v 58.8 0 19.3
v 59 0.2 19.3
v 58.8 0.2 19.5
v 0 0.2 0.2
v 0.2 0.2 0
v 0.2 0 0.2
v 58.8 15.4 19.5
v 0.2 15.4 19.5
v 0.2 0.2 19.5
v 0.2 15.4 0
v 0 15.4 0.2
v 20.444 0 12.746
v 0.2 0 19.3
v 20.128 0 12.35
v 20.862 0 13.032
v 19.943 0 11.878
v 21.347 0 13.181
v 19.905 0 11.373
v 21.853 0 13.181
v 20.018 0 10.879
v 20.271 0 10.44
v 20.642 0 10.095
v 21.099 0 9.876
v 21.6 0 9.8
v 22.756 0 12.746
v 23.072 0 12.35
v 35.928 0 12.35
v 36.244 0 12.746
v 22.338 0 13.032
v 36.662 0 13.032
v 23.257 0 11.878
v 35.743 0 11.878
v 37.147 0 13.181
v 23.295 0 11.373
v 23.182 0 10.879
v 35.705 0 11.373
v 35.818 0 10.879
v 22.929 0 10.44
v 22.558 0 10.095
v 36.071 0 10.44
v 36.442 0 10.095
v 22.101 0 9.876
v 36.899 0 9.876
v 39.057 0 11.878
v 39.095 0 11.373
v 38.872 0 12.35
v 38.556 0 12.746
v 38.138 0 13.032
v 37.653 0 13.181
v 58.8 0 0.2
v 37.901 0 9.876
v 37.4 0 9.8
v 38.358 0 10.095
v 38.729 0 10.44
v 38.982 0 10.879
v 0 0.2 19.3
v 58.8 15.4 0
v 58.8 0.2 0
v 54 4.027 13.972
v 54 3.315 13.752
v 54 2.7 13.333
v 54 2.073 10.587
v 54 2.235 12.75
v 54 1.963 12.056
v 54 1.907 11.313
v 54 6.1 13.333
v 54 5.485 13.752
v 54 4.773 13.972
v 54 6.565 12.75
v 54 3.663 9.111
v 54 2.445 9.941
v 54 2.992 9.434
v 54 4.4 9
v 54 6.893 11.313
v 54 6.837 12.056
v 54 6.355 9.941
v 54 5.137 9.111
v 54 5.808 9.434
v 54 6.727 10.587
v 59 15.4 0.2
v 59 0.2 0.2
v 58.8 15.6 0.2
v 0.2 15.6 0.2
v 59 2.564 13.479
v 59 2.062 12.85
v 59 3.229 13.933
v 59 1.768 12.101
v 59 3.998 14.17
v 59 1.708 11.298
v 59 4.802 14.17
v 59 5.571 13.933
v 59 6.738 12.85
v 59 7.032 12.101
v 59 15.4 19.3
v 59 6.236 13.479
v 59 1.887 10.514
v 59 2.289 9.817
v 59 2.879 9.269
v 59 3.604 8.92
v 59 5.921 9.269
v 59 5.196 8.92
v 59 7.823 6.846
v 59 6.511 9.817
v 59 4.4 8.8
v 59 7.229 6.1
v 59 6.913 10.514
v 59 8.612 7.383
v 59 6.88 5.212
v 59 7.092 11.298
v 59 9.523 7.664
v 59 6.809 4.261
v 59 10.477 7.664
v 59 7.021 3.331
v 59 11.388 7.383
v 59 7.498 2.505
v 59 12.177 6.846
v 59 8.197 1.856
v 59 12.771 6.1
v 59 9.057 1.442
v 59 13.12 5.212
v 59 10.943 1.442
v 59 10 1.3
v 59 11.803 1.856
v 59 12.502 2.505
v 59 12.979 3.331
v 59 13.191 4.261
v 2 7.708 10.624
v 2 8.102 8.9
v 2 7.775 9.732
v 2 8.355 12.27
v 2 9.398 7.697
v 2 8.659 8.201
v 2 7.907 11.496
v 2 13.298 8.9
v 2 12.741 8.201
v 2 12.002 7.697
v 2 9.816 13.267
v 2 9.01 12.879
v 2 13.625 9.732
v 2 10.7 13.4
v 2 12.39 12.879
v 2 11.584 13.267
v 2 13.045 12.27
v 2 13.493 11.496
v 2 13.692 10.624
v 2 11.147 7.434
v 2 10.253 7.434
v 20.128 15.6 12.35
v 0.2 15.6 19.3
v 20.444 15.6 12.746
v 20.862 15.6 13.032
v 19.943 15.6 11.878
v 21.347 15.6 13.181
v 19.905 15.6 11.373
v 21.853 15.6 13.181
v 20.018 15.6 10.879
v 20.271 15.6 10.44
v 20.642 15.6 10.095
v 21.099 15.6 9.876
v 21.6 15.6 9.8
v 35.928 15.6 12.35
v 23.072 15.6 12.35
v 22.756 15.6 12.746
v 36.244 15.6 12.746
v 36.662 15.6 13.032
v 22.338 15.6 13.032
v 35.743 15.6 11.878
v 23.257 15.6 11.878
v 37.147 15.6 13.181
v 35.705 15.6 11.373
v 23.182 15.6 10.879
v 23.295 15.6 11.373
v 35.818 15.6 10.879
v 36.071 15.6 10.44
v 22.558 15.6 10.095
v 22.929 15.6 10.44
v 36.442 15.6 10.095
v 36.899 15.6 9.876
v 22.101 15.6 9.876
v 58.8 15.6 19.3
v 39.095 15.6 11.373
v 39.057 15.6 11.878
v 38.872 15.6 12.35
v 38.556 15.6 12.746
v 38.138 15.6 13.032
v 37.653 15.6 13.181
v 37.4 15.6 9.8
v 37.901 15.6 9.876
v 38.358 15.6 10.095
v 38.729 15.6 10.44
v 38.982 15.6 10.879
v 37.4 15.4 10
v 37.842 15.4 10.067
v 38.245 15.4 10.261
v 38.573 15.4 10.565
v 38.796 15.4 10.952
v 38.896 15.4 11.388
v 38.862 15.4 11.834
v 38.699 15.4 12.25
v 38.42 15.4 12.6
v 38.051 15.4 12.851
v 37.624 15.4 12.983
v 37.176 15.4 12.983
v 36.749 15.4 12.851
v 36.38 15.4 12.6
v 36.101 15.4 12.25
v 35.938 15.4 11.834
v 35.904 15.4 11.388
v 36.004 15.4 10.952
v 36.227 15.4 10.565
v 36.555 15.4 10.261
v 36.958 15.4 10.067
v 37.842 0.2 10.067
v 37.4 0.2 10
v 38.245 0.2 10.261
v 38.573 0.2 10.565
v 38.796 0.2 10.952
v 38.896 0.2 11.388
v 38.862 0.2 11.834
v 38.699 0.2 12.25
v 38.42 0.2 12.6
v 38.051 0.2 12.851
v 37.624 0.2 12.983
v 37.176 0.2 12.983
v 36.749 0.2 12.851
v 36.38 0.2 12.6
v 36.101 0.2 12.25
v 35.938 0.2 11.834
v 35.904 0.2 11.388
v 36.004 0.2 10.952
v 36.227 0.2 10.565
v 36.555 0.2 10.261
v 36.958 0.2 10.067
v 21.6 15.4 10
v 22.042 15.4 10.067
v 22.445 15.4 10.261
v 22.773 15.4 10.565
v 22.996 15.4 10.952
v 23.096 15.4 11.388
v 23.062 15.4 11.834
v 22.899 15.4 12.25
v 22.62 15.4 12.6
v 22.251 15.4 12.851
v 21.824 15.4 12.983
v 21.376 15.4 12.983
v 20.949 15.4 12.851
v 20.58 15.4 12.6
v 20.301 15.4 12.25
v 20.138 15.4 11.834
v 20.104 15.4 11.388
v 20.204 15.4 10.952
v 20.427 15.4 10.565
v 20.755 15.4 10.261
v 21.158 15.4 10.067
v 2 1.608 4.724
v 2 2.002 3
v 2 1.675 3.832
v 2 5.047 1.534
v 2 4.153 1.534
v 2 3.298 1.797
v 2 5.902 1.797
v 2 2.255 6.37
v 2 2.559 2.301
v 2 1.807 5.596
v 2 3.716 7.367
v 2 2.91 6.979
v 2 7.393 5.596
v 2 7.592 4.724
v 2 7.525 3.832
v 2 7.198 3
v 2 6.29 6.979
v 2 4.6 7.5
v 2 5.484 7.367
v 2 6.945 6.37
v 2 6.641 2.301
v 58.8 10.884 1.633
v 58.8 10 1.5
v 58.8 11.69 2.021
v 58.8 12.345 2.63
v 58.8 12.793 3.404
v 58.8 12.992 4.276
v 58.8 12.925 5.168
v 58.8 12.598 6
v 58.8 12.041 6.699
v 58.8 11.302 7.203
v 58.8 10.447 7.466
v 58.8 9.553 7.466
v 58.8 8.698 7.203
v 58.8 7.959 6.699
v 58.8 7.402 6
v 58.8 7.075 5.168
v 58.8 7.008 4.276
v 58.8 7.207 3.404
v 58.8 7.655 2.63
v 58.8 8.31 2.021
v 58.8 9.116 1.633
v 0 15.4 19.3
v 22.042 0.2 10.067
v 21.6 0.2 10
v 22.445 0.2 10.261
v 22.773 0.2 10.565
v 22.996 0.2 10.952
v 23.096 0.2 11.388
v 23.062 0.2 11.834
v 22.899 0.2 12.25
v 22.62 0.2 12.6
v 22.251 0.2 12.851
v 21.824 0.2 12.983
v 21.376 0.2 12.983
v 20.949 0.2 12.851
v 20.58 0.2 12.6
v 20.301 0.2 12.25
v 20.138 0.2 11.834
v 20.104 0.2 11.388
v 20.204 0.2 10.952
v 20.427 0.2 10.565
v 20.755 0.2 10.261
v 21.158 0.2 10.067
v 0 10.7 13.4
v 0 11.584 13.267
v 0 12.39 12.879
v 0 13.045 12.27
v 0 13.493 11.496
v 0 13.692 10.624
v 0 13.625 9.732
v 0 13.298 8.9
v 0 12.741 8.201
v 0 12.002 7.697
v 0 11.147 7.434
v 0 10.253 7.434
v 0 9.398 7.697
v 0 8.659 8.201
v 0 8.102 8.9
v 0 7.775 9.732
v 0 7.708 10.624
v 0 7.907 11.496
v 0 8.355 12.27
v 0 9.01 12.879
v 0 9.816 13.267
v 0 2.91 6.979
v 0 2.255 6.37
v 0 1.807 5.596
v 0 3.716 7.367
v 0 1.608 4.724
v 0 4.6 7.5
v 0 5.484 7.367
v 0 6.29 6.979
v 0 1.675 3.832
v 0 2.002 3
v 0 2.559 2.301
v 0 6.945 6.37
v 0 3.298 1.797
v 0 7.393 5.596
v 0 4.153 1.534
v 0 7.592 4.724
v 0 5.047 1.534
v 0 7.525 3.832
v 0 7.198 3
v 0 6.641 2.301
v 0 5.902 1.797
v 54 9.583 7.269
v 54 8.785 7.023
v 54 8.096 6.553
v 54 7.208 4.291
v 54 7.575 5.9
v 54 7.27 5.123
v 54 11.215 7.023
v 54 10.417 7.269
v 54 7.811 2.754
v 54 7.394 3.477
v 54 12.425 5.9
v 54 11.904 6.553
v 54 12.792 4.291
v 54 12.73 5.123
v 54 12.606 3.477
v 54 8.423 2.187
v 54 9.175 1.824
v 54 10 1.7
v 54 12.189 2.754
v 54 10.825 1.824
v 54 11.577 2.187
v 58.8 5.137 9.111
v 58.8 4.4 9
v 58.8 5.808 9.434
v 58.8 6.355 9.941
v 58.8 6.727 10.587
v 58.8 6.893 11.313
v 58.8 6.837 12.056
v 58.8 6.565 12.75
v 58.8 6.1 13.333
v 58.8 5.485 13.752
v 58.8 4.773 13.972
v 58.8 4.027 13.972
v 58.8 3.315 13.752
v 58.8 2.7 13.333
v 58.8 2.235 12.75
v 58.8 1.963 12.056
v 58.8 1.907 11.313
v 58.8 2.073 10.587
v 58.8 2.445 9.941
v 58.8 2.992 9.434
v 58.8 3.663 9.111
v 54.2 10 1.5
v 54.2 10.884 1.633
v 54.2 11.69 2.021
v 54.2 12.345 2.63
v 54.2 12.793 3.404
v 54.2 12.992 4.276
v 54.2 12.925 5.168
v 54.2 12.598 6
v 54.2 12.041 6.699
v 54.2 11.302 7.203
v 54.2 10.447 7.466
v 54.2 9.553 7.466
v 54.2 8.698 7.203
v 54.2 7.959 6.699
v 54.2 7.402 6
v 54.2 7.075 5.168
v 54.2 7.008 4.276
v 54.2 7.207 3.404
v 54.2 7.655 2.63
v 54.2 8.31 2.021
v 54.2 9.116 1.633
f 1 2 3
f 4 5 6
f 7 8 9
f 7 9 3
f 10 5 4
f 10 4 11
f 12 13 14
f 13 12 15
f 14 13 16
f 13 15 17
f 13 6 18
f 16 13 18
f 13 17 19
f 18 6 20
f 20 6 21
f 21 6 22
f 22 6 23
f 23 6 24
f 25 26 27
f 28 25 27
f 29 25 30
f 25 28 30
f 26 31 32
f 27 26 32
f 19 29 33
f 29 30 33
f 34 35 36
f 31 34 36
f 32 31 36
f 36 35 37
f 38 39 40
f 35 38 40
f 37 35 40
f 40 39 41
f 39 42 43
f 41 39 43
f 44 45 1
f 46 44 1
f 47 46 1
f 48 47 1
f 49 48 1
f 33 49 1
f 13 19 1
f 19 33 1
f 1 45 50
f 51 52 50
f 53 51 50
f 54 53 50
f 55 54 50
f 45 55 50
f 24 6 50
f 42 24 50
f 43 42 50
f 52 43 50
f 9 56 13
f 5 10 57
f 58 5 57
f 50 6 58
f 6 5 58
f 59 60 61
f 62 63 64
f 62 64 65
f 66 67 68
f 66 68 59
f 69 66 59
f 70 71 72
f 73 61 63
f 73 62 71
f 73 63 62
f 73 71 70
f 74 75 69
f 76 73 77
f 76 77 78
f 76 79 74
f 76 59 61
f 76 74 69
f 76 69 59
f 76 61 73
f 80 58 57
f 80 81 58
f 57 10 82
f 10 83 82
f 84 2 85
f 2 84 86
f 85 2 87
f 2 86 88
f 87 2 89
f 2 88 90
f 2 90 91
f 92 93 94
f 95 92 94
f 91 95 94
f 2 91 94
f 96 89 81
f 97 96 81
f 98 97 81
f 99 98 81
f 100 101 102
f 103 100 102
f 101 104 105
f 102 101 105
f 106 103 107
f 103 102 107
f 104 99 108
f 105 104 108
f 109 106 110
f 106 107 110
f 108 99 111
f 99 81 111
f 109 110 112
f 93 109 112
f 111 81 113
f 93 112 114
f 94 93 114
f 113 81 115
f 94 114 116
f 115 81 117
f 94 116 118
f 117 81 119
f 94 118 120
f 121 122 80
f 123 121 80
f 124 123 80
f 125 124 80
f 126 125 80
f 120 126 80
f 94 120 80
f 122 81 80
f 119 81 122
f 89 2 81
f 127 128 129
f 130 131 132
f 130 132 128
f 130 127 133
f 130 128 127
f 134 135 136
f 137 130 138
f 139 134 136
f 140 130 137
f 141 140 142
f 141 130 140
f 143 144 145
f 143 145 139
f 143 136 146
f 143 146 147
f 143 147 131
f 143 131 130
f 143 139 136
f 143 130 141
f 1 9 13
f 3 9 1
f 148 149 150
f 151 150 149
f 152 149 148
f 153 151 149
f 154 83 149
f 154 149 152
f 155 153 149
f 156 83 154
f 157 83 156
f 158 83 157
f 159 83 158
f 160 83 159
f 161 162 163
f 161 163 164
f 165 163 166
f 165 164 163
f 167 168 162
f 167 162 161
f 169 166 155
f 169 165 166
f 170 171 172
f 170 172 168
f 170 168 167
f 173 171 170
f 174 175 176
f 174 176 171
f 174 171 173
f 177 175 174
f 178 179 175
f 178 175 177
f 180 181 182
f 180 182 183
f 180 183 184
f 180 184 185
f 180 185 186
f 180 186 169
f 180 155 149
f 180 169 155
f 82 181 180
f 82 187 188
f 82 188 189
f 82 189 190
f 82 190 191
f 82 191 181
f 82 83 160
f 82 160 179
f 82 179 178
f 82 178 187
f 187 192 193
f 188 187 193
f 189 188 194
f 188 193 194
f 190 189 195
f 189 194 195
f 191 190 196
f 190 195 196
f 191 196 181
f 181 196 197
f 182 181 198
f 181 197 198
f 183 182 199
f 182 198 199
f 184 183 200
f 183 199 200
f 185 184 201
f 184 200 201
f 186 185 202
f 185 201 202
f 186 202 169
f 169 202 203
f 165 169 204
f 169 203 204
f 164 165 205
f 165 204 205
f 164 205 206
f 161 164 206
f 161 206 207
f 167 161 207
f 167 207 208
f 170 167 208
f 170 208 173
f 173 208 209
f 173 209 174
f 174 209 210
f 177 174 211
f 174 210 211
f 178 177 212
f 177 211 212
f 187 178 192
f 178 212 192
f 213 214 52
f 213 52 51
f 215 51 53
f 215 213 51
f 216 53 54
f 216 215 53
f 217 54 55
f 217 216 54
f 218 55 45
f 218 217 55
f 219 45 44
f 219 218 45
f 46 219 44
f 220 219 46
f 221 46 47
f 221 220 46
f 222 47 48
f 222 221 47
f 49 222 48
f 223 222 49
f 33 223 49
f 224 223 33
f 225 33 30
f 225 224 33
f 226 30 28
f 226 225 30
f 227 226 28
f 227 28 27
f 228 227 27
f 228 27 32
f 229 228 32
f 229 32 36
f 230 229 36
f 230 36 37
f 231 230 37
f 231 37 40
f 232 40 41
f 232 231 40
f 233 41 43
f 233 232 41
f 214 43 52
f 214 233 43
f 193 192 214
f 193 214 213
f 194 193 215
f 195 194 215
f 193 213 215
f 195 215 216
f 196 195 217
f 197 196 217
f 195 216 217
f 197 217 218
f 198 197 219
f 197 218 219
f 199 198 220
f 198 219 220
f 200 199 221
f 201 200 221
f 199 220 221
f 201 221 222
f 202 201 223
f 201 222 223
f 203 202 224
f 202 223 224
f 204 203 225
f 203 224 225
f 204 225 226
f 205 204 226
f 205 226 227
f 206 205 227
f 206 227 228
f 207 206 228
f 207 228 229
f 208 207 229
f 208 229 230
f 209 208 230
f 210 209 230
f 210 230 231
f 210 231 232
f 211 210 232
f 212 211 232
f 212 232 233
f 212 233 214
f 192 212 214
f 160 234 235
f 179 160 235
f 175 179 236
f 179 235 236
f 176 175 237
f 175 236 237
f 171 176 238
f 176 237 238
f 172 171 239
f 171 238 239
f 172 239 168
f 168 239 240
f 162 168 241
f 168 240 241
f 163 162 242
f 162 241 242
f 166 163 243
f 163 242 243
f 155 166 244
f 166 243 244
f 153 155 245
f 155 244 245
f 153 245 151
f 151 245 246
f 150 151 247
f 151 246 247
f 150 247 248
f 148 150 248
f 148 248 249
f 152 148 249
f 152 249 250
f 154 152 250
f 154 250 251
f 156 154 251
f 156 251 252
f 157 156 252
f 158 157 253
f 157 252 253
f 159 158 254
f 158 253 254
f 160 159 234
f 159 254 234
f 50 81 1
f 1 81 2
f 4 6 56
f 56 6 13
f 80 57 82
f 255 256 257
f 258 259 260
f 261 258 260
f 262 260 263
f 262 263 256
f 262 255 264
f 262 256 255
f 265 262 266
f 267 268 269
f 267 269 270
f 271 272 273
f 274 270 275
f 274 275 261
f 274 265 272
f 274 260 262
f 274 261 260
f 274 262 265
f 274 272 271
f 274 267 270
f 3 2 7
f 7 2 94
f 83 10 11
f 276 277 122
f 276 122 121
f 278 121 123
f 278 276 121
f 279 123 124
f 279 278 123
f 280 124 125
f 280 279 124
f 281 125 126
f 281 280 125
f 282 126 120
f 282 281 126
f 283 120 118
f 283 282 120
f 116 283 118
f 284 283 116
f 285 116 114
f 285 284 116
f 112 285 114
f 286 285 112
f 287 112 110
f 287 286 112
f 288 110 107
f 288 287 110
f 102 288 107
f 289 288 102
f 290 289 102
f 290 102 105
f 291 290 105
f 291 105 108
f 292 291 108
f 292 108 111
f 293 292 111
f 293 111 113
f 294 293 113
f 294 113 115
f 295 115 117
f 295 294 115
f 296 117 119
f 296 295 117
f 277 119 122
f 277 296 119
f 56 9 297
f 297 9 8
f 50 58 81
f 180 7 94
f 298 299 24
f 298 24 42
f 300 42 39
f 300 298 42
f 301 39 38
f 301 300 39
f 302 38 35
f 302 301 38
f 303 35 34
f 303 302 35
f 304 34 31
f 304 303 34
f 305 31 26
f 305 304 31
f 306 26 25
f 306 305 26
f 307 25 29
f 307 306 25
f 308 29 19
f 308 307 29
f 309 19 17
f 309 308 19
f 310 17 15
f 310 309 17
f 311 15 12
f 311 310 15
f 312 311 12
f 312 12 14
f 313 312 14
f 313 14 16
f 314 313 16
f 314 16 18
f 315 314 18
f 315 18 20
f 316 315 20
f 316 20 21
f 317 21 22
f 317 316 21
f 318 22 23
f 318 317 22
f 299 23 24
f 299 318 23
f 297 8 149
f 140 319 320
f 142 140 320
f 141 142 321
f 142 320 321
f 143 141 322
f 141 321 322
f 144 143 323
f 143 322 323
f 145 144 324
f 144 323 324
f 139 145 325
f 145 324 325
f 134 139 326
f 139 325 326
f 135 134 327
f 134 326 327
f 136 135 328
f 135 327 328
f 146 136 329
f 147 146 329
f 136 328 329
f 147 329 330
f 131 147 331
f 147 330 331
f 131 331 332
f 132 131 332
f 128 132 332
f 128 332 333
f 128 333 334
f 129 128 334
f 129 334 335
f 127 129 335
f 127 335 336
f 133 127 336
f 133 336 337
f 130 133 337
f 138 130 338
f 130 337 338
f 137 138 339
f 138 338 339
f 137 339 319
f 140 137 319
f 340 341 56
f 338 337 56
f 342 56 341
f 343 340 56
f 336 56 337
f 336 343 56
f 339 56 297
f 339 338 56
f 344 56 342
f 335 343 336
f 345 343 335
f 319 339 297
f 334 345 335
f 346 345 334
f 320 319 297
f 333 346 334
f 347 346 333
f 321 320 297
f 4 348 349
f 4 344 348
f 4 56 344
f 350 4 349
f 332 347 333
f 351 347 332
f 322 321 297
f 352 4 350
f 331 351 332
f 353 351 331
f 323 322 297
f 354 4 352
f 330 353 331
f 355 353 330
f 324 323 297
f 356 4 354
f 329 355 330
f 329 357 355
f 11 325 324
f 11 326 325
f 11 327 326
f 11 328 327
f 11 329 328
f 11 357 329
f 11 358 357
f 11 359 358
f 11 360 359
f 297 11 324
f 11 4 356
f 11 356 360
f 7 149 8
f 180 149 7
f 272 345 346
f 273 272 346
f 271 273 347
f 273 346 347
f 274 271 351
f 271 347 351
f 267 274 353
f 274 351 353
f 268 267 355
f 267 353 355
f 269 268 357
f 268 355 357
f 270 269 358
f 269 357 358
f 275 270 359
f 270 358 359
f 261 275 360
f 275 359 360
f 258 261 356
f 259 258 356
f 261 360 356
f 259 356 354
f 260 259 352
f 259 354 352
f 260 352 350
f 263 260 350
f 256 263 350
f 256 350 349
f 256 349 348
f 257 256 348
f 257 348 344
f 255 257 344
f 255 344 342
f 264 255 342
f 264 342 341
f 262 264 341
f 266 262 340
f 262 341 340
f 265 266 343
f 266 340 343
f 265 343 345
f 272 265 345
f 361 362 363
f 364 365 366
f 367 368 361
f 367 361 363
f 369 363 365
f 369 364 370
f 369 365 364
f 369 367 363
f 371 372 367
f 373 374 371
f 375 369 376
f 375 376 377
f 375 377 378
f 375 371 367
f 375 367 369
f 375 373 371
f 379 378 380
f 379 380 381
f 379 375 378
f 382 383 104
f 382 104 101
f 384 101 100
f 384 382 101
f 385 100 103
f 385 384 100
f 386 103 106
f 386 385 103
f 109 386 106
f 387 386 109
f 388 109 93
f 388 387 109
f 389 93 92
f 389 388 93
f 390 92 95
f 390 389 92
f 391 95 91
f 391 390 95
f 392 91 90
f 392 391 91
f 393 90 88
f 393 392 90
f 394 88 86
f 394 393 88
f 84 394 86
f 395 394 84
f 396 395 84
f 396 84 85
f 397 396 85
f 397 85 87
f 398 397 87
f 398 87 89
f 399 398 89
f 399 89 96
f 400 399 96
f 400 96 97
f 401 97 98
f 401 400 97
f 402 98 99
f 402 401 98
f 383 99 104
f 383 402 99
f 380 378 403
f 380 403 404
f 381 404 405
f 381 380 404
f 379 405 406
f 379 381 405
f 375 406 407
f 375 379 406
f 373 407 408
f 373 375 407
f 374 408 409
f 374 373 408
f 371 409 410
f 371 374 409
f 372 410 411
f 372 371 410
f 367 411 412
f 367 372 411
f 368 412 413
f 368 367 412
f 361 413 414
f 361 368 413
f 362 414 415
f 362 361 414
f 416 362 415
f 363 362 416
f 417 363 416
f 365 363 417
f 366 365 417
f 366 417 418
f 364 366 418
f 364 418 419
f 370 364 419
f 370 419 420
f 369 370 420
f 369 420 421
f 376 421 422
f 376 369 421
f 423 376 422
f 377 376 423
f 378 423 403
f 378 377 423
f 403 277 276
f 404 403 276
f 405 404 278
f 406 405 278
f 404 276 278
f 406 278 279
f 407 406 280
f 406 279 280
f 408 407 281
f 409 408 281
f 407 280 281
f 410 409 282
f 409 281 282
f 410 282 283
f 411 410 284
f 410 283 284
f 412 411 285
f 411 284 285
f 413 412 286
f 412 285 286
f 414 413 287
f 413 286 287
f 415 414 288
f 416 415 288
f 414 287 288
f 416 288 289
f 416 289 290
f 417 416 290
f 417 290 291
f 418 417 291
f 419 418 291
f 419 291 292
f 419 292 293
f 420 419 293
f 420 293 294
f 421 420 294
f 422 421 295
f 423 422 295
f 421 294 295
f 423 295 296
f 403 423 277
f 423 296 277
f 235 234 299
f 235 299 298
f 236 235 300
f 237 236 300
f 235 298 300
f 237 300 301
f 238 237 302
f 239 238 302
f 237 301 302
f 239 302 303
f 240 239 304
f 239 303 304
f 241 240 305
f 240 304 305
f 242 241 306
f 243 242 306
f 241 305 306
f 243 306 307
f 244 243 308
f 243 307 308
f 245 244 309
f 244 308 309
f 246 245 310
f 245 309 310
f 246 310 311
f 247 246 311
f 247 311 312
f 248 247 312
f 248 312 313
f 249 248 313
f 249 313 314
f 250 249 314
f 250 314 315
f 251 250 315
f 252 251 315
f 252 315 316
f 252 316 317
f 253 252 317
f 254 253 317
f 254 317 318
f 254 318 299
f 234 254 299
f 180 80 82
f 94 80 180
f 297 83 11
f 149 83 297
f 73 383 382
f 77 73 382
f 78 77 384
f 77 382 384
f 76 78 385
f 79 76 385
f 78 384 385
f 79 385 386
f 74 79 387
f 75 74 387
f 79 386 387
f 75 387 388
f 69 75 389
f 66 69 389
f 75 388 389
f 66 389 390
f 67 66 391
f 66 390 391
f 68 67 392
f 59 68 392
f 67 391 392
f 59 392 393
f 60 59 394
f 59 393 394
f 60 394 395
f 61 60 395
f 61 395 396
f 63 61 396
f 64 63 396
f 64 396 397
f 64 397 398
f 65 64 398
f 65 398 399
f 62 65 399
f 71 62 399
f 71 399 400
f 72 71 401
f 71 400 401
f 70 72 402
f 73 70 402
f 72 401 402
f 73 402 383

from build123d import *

# Parameters (mm, degrees)
SKETCH1_W           = 59
SKETCH1_H           = 15.6
BOSS_EXTRUDE1_DEPTH = 19.5
SKETCH2_R           = 3
CUT_EXTRUDE1_DEPTH  = 2
SKETCH3_R           = 3
SKETCH3_R_2         = 2.5
CUT_EXTRUDE2_DEPTH  = 5
SKETCH4_R           = 1.5
CUT_EXTRUDE3_DEPTH  = 65.067230313
CHAMFER1_SIZE       = 0.2


with BuildPart() as part:
    # Sketch1 → Boss-Extrude1 (new body)
    with BuildSketch(Plane.XY):
        with Locations((29.5, 7.8)):
            Rectangle(SKETCH1_W, SKETCH1_H)
    extrude(amount=BOSS_EXTRUDE1_DEPTH)

    # Sketch2 → Cut-Extrude1 (cut)
    with BuildSketch(Plane.ZY):
        with Locations((10.4, 10.7)):
            Circle(SKETCH2_R)
        with Locations((4.5, 4.6)):
            Circle(SKETCH2_R)
    extrude(amount=-CUT_EXTRUDE1_DEPTH, mode=Mode.SUBTRACT)

    # Sketch3 → Cut-Extrude2 (cut)
    with BuildSketch(Plane(origin=(59, 0, 0), x_dir=(0, 0, -1), z_dir=(1, 0, 0))):
        with Locations((-4.5, 10)):
            Circle(SKETCH3_R)
        with Locations((-11.5, 4.4)):
            Circle(SKETCH3_R_2)
    extrude(amount=-CUT_EXTRUDE2_DEPTH, mode=Mode.SUBTRACT)

    # Sketch4 → Cut-Extrude3 (cut, through all)
    with BuildSketch(Plane.XZ):
        with Locations(Location((21.6, 11.5, 0), (0, 0, 270))):
            Circle(SKETCH4_R)
        with Locations(Location((37.4, 11.5, 0), (0, 0, 270))):
            Circle(SKETCH4_R)
    extrude(amount=-CUT_EXTRUDE3_DEPTH, mode=Mode.SUBTRACT)

    # Chamfer1
    chamfer1_edges = [part.edges().sort_by_distance(p)[0] for p in [
        (59, 7.8, 19.5),
        (29.5, 15.6, 19.5),
        (54, 10, 7.5),
        (59, 10, 7.5),
        (59, 4.4, 14),
        (21.6, 15.6, 13),
        (21.6, 0, 13),
        (37.4, 15.6, 13),
        (37.4, 0, 13),
        (0, 7.8, 19.5),
        (29.5, 15.6, 0),
        (59, 7.8, 0),
        (29.5, 0, 0),
        (0, 7.8, 0),
        (0, 15.6, 9.75),
        (59, 15.6, 9.75),
        (59, 0, 9.75),
        (0, 0, 9.75),
        (29.5, 0, 19.5),
    ]]
    chamfer(chamfer1_edges, length=CHAMFER1_SIZE)


solid = part.part
